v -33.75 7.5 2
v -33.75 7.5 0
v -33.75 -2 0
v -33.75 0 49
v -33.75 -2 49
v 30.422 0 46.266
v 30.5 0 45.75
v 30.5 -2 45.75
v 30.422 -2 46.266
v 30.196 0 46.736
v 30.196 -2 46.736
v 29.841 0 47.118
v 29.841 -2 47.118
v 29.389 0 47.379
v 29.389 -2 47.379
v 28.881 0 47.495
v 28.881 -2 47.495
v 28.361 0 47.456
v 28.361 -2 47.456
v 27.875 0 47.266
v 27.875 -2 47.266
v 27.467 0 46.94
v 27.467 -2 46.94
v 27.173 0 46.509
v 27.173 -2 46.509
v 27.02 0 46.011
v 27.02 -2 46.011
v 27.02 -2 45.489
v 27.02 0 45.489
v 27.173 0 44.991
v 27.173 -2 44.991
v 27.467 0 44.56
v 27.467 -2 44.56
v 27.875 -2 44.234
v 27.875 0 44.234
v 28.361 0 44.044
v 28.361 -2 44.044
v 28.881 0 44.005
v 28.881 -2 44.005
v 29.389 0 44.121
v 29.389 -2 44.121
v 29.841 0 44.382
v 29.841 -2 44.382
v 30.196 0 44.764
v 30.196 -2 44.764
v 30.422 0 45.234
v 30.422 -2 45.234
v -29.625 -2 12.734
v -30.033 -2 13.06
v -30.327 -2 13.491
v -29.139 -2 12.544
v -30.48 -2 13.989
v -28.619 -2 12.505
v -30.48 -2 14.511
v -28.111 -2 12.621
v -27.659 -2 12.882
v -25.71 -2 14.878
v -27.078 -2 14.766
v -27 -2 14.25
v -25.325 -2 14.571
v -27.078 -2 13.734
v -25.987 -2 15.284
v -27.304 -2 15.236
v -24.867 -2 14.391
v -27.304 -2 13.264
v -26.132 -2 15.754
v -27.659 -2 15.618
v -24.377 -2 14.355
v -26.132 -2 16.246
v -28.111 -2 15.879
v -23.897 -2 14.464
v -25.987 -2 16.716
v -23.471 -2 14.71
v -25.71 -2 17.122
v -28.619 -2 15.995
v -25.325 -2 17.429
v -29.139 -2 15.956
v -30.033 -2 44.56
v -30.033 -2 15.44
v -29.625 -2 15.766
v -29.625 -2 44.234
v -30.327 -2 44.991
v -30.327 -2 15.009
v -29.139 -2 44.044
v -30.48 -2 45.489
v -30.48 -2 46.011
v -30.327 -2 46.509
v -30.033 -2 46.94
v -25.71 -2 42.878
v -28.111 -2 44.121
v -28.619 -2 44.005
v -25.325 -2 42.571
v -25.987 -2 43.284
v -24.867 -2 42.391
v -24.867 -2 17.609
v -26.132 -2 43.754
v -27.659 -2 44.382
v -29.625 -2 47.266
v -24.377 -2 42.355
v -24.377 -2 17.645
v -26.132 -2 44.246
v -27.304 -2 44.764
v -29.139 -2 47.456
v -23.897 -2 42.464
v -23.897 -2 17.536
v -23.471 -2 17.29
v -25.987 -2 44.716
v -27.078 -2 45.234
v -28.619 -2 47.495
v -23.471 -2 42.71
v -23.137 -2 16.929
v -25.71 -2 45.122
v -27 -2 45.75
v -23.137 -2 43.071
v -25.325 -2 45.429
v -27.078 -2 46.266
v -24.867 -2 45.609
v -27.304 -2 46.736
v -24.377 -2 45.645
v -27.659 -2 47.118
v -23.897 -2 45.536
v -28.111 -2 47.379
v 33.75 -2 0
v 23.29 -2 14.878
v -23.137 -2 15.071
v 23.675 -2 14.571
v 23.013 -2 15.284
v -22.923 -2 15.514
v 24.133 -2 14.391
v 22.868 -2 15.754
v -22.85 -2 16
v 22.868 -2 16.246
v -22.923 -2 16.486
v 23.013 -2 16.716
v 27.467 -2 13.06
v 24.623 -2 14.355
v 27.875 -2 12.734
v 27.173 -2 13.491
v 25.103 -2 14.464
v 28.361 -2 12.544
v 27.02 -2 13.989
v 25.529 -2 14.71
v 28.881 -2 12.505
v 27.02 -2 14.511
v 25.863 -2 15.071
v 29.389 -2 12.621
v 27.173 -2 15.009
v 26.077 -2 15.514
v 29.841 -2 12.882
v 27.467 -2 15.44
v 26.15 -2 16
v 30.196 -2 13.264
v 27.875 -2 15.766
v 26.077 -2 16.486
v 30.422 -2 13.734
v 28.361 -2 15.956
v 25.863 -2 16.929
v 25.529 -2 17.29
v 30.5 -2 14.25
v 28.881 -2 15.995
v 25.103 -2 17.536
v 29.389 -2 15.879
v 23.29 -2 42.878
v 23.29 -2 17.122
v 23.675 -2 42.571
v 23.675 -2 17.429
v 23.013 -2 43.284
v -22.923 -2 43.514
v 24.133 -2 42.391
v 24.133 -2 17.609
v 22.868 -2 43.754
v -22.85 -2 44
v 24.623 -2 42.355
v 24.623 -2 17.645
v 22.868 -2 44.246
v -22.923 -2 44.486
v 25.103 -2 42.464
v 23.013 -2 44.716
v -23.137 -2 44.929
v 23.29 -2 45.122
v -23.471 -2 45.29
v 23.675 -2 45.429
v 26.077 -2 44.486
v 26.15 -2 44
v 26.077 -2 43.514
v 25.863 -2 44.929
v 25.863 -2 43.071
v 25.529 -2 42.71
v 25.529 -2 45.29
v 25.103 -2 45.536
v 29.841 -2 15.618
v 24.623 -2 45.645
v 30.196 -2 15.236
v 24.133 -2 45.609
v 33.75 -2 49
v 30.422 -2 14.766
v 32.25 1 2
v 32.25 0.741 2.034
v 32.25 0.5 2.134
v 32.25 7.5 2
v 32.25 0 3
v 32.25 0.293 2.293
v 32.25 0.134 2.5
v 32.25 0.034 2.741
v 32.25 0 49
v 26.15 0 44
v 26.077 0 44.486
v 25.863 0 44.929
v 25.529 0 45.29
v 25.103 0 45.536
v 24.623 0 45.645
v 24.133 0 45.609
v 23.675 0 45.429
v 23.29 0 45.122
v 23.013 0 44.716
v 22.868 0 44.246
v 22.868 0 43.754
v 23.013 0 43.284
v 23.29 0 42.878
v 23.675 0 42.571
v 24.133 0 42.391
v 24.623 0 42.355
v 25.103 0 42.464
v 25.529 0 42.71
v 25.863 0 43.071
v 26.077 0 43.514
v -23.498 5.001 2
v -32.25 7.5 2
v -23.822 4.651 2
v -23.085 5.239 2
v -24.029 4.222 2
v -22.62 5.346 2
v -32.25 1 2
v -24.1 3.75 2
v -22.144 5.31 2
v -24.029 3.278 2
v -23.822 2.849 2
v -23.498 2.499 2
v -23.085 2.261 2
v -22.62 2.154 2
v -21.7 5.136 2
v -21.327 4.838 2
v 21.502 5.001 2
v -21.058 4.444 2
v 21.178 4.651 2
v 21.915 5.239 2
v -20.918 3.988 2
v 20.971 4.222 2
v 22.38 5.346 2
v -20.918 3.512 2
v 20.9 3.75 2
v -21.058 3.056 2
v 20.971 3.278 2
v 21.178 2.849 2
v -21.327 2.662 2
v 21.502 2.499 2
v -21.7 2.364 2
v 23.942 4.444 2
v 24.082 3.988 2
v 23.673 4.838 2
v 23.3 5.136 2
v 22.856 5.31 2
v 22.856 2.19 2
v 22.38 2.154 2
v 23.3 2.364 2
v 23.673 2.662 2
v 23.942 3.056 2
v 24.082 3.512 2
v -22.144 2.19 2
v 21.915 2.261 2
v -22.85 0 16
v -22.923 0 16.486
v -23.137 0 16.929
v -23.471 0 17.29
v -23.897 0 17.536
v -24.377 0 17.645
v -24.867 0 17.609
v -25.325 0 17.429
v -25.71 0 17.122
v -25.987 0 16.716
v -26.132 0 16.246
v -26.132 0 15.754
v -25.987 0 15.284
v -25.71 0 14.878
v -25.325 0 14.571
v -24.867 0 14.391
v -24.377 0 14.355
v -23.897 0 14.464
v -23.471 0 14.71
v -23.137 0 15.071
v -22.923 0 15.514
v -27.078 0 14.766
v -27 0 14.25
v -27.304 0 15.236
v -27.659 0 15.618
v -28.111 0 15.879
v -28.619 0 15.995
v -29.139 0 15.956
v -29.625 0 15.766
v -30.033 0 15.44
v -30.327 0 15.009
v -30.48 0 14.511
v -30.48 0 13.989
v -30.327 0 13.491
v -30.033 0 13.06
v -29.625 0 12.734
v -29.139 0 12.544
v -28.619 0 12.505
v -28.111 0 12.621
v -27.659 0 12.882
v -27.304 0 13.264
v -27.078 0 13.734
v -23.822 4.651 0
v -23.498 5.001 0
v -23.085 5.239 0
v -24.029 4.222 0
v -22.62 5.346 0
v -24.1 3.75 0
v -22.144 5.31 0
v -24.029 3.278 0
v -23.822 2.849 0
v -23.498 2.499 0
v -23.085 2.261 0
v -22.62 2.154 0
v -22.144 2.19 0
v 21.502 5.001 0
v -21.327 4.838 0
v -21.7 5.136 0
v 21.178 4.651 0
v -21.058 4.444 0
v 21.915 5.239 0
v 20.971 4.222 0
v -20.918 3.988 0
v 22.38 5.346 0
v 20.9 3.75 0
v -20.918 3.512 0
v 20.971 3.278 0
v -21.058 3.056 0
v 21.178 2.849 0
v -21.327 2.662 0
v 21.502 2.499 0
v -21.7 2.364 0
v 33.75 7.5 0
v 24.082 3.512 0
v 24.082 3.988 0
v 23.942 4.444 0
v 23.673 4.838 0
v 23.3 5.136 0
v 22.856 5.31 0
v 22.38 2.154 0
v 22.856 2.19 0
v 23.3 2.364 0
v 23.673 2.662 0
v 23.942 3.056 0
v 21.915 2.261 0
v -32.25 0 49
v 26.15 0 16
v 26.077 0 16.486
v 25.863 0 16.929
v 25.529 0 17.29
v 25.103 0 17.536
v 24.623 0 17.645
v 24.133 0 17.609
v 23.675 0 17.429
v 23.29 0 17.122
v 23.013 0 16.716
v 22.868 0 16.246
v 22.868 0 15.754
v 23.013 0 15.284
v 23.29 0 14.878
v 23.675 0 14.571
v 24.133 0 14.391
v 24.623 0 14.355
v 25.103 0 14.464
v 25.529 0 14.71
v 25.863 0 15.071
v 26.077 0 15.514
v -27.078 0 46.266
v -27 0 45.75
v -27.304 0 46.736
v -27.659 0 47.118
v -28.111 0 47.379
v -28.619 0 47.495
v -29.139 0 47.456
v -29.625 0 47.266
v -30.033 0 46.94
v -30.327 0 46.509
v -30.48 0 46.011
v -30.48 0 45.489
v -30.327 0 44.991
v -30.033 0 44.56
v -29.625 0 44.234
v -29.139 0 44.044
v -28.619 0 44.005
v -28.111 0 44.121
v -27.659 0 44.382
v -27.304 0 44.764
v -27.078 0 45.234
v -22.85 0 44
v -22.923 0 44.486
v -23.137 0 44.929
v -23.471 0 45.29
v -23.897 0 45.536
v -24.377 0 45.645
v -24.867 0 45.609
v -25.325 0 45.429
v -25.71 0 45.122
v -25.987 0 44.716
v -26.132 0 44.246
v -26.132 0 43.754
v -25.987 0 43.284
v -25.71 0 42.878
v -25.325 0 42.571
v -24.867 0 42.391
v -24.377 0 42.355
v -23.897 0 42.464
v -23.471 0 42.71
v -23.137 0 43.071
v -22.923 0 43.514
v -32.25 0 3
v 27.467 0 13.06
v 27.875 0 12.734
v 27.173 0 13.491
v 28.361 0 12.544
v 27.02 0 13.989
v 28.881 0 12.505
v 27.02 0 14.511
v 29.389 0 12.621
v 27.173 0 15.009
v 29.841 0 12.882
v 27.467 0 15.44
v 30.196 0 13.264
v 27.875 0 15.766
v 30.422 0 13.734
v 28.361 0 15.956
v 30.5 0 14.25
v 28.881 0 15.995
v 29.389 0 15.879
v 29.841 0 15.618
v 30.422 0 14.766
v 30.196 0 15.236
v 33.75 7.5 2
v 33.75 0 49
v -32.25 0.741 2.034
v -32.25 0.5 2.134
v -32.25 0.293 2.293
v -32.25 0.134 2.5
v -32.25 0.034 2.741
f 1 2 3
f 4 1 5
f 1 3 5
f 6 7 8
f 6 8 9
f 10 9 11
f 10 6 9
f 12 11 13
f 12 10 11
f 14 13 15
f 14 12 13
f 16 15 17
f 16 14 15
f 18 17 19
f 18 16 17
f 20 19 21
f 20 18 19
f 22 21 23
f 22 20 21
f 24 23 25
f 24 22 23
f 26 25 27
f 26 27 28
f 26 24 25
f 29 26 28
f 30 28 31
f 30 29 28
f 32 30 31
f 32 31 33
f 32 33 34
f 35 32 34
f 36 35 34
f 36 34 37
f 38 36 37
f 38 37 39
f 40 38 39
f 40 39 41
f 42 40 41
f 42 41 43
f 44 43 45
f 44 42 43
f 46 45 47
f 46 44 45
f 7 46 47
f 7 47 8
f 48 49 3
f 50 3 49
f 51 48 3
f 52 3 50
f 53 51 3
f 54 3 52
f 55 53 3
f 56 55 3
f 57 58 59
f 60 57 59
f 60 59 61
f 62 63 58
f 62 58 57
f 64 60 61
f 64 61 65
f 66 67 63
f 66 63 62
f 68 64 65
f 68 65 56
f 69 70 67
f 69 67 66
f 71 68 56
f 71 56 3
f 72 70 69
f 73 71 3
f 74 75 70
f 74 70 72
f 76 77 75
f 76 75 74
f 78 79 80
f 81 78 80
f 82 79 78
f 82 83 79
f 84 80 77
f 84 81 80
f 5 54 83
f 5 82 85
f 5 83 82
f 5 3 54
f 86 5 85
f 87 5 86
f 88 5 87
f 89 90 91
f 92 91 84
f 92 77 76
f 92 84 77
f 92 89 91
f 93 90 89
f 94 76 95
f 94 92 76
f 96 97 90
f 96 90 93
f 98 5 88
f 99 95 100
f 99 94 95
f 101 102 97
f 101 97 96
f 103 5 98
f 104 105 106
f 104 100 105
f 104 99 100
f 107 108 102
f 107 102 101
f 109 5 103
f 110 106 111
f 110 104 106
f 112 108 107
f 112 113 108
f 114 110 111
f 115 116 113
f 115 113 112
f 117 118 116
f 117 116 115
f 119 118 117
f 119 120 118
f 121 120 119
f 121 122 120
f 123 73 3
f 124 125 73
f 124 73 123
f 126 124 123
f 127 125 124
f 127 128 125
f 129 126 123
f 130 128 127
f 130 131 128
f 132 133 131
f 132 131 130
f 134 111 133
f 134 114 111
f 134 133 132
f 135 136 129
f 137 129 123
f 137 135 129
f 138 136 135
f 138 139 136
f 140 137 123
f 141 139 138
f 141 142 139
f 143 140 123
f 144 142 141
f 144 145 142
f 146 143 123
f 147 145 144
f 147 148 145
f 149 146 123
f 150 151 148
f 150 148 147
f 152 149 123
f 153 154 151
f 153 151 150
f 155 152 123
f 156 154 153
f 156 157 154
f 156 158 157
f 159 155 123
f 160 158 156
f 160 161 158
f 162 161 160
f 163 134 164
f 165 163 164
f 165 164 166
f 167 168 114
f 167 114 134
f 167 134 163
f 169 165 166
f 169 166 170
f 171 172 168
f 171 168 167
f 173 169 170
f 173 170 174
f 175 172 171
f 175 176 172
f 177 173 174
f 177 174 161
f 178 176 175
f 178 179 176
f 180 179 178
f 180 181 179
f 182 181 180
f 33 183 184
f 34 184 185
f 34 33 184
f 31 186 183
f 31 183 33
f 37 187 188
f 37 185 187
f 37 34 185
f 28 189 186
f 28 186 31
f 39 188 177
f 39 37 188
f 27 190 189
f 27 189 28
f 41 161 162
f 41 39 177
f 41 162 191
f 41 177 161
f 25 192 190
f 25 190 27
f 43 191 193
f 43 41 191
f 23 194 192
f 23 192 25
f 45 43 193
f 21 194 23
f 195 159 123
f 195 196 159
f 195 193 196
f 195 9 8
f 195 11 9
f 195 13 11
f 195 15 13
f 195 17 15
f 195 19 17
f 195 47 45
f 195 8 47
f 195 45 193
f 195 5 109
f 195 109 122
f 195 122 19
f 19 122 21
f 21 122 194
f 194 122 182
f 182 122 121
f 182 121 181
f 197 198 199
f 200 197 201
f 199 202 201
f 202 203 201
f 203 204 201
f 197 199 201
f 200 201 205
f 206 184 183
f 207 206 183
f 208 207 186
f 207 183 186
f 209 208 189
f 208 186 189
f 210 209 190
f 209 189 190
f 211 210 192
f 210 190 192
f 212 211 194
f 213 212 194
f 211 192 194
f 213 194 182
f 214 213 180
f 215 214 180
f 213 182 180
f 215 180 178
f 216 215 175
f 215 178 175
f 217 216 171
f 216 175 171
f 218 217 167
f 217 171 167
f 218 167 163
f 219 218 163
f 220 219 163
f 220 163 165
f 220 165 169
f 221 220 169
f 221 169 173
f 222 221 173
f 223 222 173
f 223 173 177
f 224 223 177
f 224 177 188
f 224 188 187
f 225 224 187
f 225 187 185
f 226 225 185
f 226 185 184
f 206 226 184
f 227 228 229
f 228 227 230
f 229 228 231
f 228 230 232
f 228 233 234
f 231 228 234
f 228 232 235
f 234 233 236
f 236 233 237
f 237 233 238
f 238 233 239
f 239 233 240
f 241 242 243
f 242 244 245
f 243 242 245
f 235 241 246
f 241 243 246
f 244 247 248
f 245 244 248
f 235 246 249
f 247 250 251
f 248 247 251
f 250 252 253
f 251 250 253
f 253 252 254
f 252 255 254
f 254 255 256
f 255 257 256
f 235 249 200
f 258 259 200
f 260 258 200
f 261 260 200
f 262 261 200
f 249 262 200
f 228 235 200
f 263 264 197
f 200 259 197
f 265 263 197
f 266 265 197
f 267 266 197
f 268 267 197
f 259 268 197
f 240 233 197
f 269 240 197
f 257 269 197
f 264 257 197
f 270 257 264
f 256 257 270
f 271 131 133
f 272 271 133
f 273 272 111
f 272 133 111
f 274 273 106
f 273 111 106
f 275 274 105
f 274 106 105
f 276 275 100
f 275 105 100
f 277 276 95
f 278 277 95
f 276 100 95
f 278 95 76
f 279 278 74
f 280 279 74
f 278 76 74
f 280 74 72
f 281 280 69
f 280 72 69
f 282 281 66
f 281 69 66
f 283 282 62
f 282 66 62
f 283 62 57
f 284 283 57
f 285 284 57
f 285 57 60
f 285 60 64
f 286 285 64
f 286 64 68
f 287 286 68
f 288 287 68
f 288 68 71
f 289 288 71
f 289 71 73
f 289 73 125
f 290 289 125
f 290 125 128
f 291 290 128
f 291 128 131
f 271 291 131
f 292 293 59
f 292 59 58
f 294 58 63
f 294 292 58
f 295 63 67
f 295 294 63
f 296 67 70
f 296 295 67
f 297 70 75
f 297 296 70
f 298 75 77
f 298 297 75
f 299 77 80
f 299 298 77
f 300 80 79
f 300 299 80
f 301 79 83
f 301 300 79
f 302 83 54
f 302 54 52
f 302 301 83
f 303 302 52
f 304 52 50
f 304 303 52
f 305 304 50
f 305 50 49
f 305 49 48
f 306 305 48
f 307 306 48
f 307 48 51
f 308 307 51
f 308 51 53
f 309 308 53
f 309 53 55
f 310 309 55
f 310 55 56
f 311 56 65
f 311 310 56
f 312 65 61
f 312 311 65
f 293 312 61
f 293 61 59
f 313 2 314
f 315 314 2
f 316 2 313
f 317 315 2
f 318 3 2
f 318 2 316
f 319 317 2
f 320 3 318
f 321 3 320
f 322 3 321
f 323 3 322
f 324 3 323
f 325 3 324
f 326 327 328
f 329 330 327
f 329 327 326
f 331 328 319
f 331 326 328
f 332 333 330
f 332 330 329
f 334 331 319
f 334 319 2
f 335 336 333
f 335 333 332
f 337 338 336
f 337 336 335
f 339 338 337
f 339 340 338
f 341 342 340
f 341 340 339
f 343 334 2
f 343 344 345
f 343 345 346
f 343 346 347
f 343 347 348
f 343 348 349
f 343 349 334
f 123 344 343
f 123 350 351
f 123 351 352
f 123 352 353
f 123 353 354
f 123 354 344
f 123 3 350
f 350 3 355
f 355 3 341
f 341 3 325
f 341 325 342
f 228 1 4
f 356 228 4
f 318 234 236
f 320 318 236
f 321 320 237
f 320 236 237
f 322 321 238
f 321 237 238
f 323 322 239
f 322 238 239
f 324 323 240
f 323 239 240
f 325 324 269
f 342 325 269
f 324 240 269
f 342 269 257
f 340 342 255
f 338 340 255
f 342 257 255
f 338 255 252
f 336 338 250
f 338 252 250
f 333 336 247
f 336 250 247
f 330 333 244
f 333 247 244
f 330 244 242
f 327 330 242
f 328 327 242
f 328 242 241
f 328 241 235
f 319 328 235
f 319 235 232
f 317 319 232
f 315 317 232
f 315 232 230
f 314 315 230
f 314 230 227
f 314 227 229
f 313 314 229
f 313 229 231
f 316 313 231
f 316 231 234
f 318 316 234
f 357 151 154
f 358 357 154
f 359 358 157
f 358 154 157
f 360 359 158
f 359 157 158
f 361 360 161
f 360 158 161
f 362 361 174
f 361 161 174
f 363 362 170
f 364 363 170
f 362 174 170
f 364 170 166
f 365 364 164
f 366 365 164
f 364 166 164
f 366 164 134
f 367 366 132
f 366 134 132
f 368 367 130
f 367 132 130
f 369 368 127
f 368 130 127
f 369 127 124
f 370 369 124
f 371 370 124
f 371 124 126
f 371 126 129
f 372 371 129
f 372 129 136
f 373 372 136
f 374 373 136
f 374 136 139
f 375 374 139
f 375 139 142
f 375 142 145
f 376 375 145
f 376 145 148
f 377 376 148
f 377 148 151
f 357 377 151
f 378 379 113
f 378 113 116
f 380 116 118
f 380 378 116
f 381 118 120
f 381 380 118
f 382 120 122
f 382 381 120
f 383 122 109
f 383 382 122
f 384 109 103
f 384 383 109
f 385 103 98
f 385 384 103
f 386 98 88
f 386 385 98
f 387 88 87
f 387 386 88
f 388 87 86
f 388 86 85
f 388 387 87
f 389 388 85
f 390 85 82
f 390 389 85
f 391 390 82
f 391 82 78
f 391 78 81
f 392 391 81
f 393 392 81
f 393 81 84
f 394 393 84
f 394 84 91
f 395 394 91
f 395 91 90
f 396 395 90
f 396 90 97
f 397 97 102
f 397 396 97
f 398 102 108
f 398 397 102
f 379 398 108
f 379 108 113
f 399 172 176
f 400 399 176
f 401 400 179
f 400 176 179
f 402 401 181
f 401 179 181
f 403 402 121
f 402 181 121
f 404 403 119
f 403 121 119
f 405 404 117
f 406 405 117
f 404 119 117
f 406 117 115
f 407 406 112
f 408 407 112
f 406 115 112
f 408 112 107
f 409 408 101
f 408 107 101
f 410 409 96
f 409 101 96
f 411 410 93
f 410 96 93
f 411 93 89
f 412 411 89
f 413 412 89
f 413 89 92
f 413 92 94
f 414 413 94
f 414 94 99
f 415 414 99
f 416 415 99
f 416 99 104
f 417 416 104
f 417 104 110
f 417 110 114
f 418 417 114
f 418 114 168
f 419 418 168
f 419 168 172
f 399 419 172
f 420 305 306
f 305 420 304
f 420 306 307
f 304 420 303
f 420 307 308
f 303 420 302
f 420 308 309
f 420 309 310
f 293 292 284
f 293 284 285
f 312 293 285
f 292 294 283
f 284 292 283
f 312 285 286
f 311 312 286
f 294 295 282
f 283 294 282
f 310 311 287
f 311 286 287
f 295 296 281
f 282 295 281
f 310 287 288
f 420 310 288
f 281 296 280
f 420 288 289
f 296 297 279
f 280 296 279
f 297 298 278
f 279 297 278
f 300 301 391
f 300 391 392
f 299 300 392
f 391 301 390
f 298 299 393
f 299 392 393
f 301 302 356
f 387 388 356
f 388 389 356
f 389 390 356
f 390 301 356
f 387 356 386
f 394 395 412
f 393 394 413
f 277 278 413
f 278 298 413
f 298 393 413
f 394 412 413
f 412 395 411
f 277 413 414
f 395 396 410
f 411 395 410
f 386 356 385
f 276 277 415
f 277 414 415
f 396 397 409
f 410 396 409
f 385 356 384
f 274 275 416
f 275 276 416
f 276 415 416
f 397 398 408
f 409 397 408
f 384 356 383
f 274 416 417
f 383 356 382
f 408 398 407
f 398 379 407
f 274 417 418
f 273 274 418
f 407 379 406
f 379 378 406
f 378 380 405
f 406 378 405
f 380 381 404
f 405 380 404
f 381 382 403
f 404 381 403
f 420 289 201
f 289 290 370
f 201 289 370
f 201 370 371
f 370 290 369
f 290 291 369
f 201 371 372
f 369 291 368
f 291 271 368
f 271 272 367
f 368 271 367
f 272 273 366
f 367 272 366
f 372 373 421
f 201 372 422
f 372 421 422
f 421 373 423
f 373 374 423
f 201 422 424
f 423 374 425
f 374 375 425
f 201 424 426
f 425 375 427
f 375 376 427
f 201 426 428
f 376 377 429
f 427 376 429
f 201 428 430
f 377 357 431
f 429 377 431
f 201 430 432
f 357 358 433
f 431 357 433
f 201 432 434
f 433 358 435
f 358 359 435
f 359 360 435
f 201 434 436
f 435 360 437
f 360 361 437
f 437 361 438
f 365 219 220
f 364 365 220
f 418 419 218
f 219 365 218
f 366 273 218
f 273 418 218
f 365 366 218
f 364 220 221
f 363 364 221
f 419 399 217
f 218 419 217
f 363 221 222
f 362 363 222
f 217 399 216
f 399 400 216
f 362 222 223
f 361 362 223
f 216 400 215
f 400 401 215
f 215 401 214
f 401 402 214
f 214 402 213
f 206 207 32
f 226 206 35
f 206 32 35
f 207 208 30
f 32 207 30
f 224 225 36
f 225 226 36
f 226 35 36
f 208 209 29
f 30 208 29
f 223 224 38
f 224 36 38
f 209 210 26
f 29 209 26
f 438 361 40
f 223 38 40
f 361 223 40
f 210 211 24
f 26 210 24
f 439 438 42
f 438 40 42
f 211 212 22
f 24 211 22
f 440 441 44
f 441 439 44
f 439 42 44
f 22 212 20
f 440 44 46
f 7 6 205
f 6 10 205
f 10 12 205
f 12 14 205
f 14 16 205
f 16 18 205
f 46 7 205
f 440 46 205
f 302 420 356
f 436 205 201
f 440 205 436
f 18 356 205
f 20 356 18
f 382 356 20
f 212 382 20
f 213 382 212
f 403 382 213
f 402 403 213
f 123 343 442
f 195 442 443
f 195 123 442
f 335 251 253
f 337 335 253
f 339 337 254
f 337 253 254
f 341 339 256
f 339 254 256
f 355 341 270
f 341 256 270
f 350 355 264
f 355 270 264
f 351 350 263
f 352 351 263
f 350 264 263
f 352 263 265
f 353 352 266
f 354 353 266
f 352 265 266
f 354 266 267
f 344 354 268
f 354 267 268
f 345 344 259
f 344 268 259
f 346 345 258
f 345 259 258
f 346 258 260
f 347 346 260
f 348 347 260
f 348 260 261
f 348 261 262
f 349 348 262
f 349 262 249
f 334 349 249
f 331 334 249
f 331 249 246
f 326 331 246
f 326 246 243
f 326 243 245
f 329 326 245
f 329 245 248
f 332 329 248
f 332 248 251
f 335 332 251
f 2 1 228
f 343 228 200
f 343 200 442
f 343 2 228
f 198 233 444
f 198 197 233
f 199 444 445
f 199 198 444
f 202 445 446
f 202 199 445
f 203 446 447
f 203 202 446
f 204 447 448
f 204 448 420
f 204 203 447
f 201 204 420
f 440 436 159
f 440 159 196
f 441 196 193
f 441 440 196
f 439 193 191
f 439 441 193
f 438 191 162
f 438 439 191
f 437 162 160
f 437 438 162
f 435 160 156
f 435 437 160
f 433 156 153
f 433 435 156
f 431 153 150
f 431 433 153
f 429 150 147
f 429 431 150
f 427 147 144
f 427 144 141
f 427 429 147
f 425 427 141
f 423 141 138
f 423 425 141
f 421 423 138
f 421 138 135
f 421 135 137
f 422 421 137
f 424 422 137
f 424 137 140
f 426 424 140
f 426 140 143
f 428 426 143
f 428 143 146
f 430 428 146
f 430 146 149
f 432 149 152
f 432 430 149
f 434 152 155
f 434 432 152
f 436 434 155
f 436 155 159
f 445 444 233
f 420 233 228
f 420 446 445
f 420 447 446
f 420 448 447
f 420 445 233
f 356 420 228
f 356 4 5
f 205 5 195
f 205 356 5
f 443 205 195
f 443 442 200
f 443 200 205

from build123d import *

# Parameters (mm, degrees)
SKETCH_W        = 67.5
SKETCH_H        = 49
SKETCH_R        = 1.75
PAD_DEPTH       = 2
SKETCH001_W     = 67.5
SKETCH001_H     = 2
PAD001_DEPTH    = 7.5
PAD002_DEPTH    = 1.5
SKETCH003_R     = 1.6
POCKET_DEPTH    = 2.001
FILLET_R        = 1
SKETCH004_R     = 1.65
POCKET001_DEPTH = 9.501


with BuildPart() as part:
    # Sketch → Pad (new body)
    with BuildSketch(Plane.XZ):
        with Locations((0, 24.5)):
            Rectangle(SKETCH_W, SKETCH_H)
        with Locations((-28.75, 45.75)):
            Circle(SKETCH_R, mode=Mode.SUBTRACT)
        with Locations((-28.75, 14.25)):
            Circle(SKETCH_R, mode=Mode.SUBTRACT)
        with Locations((28.75, 45.75)):
            Circle(SKETCH_R, mode=Mode.SUBTRACT)
        with Locations((28.75, 14.25)):
            Circle(SKETCH_R, mode=Mode.SUBTRACT)
    extrude(amount=PAD_DEPTH)

    # Sketch001 (on Face9 of Pad) → Pad001 (join)
    with BuildSketch(Plane(origin=(0, 0, 0), x_dir=(1, 0, 0), z_dir=(0, 1, 0))):
        with Locations((0, -1)):
            Rectangle(SKETCH001_W, SKETCH001_H)
    extrude(amount=PAD001_DEPTH)

    # Sketch002 (on Face12 of Pad001) → Pad002 (join)
    with BuildSketch(Plane(origin=(33.75, 0, 0), x_dir=(0, 0, 1), z_dir=(1, 0, 0))):
        Polygon((2, 0), (2, -7.5), (49, 0), align=None)
    pad002 = extrude(amount=-PAD002_DEPTH)

    # Mirrored: Pad002 across YZ
    add(pad002.mirror(Plane.YZ))

    # Sketch003 (on Face13 of Mirrored) → Pocket (cut, through all)
    with BuildSketch(Plane(origin=(0, 0, 2), x_dir=(-1, 0, 0), z_dir=(0, 0, 1))):
        with Locations((-22.5, -3.75)):
            Circle(SKETCH003_R)
        with Locations((22.5, -3.75)):
            Circle(SKETCH003_R)
    extrude(amount=-POCKET_DEPTH, mode=Mode.SUBTRACT)

    # Fillet
    fillet_edges = [part.edges().sort_by_distance(p)[0] for p in [
        (0, 0, 2),
    ]]
    fillet(fillet_edges, radius=FILLET_R)

    # Sketch004 (on Face15 of Fillet) → Pocket001 (cut, through all)
    with BuildSketch(Plane.XZ.offset(2)):
        with Locations((-24.5, 44)):
            Circle(SKETCH004_R)
        with Locations((24.5, 44)):
            Circle(SKETCH004_R)
        with Locations((24.5, 16)):
            Circle(SKETCH004_R)
        with Locations((-24.5, 16)):
            Circle(SKETCH004_R)
    extrude(amount=-POCKET001_DEPTH, mode=Mode.SUBTRACT)


solid = part.part
